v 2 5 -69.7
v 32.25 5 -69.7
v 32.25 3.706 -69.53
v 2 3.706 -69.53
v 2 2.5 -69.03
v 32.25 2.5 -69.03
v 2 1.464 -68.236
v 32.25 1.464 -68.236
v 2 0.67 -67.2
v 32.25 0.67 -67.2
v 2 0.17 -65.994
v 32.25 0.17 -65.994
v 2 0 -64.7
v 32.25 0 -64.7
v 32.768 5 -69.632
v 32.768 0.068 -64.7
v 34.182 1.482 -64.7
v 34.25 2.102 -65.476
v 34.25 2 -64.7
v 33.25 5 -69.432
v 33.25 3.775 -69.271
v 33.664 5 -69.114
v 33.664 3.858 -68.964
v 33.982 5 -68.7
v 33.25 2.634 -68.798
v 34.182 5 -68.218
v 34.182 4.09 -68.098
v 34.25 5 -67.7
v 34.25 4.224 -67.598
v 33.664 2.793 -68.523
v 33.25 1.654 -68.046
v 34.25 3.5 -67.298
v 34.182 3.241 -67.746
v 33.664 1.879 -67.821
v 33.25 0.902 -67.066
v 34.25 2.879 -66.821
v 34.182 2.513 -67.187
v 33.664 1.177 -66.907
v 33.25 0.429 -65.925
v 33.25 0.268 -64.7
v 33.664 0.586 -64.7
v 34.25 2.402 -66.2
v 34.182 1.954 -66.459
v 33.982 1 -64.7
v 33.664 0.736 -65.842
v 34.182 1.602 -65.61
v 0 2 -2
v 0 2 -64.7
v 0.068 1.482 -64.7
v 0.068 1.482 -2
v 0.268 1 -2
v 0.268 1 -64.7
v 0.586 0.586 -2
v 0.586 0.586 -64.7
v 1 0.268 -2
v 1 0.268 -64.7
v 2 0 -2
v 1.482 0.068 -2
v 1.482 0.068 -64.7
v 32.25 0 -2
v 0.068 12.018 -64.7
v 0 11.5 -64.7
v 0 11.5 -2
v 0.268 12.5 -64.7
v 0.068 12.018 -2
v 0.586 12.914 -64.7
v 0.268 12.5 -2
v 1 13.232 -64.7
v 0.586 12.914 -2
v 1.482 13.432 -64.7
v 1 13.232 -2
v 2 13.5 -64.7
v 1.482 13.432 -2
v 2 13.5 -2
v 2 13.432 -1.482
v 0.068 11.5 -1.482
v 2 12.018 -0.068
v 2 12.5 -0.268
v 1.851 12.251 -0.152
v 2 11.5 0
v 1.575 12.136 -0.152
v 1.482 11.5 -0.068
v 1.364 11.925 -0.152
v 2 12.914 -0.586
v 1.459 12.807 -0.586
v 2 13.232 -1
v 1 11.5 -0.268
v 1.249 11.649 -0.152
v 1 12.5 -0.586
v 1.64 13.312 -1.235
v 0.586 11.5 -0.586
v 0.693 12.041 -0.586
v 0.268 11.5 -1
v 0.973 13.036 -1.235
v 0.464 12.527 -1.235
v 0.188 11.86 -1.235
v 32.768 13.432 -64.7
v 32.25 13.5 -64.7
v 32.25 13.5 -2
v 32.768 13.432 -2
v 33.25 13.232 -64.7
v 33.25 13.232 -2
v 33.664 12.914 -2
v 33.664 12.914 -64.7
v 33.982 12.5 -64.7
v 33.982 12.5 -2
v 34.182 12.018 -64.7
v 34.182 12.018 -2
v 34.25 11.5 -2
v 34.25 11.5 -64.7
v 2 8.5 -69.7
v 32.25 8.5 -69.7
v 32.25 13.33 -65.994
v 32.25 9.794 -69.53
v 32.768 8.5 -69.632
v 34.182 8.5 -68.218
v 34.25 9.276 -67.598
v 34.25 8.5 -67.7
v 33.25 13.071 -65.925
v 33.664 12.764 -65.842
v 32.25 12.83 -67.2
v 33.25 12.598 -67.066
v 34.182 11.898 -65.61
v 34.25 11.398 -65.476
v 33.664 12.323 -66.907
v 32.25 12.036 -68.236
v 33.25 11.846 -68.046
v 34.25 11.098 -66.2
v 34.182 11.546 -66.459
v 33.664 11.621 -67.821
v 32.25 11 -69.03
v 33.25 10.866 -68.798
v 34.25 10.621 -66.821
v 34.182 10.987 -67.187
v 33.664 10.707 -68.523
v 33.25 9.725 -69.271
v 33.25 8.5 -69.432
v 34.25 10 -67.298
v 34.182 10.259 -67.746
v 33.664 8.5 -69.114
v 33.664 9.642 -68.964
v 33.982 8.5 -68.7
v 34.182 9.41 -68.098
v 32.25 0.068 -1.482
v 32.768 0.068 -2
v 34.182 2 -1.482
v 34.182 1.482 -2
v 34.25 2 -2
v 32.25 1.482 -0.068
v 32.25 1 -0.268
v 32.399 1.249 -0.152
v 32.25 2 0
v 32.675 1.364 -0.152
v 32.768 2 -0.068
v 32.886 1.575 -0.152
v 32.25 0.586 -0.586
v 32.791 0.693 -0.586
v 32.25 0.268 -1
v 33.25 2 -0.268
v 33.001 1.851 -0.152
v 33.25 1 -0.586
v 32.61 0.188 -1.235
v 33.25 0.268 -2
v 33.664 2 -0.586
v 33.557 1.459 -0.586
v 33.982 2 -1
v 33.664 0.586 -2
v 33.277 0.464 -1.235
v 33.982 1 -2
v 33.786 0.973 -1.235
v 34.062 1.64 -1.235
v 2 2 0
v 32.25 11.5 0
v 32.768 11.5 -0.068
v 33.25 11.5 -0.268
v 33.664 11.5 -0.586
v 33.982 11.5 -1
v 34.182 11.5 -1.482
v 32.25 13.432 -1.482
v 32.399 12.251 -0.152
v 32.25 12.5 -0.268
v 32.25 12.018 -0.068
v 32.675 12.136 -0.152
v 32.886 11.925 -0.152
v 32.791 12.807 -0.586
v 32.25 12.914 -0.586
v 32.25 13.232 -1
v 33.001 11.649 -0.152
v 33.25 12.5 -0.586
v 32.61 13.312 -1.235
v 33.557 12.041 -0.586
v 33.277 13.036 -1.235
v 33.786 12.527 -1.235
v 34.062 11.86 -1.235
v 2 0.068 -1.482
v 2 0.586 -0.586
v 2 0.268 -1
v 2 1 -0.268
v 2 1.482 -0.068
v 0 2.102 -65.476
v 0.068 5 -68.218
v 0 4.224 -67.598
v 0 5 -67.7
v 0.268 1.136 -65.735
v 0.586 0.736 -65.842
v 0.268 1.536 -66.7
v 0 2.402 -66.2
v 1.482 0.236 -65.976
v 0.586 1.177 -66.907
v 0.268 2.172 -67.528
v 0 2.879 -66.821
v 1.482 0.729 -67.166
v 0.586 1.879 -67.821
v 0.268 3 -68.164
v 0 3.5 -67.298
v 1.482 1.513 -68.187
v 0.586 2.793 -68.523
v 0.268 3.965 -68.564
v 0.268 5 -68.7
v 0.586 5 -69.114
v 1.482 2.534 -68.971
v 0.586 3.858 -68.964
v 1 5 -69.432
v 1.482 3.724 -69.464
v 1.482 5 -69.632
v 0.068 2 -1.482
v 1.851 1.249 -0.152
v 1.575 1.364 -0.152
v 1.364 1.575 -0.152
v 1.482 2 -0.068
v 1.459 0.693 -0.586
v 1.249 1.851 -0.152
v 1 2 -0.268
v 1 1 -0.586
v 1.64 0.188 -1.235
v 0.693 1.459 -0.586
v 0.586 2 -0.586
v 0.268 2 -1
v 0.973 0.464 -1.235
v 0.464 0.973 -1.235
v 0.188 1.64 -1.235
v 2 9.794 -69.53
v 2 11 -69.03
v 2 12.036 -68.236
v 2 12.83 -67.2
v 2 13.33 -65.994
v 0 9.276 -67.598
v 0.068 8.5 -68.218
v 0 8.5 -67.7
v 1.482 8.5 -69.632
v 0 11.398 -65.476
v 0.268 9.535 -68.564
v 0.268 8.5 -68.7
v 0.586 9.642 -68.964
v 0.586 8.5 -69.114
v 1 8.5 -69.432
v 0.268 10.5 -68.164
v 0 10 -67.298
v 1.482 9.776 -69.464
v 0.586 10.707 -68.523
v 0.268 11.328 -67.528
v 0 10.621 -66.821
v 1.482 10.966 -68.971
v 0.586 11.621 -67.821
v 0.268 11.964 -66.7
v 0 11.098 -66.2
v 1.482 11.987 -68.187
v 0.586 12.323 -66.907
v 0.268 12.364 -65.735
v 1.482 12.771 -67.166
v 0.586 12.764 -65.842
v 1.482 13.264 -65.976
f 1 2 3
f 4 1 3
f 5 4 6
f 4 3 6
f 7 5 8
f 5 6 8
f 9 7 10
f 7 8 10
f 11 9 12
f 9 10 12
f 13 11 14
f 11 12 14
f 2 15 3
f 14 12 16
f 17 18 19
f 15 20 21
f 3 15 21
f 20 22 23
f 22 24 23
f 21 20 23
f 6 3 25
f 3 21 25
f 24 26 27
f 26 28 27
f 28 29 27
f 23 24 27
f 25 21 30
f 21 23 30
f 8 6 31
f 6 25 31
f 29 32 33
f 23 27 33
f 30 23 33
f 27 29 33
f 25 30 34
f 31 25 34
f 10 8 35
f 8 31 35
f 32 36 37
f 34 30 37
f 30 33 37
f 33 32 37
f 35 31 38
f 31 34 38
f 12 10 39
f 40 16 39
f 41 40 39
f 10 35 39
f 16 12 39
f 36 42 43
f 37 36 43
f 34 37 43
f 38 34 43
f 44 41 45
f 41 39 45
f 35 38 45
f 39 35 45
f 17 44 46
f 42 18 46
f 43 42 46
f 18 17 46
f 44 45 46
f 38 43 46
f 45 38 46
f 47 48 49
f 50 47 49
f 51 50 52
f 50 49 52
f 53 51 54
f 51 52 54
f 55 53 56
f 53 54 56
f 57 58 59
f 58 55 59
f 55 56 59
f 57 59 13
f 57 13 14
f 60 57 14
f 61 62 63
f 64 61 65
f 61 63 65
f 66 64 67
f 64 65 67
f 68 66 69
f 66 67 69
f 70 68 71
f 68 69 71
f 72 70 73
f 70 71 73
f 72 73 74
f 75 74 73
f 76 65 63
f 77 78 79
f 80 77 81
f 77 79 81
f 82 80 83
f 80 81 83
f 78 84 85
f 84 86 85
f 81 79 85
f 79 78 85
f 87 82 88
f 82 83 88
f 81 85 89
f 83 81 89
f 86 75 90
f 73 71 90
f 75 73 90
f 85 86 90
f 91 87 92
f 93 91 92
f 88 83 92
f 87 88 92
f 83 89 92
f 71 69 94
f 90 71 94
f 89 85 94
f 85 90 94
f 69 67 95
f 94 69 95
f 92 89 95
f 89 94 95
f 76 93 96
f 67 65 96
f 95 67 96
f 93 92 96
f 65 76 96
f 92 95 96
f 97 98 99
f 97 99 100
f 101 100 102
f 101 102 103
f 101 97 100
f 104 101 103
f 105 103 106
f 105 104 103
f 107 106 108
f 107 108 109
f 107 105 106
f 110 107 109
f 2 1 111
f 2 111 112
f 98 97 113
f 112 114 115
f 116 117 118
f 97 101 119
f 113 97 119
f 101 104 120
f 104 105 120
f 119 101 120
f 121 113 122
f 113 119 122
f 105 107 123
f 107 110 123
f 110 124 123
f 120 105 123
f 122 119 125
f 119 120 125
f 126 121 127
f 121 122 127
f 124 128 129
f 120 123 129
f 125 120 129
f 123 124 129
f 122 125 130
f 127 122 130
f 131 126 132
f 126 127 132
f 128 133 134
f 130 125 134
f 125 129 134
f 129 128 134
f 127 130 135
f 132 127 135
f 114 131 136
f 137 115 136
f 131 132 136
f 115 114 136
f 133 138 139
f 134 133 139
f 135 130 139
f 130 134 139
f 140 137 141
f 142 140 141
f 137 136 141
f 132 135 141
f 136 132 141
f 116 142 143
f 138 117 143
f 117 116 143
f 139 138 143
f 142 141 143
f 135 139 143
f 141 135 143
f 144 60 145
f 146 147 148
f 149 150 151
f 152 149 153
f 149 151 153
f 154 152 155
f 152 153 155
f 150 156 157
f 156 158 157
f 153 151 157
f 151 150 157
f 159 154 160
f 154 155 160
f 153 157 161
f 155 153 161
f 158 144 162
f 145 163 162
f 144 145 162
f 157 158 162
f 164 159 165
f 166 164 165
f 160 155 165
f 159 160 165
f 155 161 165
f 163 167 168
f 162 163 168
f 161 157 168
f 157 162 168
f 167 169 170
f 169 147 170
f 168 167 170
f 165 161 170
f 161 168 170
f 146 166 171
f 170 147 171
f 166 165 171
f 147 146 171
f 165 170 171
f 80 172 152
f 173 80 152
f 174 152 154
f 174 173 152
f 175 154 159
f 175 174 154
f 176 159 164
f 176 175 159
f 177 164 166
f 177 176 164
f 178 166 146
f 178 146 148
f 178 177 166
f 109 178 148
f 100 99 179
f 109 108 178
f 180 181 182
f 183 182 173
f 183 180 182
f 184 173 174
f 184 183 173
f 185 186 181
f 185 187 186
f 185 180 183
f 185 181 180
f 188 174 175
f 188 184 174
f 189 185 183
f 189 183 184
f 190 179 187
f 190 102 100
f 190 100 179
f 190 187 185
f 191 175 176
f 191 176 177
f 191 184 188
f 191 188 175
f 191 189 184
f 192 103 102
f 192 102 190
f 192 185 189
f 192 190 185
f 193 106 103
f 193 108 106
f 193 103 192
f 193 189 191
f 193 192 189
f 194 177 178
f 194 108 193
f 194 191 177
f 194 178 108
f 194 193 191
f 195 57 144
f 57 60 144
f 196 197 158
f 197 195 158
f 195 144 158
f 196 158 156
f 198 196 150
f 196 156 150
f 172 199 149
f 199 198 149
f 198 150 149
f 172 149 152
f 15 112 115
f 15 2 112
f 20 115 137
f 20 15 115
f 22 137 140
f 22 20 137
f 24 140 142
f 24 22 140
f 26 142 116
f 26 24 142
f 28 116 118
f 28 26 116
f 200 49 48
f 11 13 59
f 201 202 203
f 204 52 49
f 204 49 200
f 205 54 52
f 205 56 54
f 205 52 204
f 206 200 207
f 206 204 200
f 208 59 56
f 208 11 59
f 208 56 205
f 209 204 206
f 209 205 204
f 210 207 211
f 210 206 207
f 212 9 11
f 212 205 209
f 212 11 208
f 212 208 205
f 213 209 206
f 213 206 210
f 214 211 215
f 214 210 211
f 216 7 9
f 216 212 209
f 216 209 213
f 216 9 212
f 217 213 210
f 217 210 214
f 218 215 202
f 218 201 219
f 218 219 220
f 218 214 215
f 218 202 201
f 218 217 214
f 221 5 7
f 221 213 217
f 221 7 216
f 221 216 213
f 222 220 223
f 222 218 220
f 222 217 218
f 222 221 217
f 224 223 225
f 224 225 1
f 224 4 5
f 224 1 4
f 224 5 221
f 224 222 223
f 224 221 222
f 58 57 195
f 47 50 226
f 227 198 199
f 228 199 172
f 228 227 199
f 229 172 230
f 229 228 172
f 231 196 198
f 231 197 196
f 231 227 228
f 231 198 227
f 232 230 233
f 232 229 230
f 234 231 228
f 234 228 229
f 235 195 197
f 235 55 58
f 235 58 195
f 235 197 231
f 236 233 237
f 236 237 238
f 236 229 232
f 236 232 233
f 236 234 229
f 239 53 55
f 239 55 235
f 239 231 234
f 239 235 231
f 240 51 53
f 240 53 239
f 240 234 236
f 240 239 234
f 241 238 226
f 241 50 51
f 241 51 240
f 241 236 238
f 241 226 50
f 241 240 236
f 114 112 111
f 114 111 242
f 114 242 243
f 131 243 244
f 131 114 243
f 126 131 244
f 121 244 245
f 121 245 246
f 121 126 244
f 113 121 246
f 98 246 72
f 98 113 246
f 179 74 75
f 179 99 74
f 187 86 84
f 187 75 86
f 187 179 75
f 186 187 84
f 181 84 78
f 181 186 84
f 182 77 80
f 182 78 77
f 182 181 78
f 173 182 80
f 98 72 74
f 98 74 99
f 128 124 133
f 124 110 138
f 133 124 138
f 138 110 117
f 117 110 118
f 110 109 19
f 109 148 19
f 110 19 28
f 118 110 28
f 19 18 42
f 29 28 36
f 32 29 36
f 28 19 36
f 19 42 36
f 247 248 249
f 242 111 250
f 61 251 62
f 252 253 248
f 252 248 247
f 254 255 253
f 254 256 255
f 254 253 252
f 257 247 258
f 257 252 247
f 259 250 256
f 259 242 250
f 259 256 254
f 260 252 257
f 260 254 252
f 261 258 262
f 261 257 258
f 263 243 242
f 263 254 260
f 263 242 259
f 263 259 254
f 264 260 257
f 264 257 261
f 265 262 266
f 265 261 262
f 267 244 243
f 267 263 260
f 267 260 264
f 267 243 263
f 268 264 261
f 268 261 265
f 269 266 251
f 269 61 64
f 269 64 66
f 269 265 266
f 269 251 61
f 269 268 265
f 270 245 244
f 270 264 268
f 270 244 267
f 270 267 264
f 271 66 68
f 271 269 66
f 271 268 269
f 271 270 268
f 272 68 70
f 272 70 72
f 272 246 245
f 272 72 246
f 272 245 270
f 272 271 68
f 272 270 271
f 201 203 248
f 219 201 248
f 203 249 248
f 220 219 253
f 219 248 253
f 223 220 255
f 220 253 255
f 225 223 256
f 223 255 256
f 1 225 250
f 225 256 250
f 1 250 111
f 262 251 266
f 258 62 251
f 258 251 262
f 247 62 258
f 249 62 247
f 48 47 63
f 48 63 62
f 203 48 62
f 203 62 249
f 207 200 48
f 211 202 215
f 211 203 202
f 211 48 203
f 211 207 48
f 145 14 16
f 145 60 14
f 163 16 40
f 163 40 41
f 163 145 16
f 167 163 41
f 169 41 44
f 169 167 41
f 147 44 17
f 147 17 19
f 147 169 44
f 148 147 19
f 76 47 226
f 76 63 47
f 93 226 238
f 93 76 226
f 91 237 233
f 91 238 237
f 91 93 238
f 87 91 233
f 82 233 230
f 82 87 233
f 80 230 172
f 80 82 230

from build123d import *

# Parameters (mm, degrees)
SKETCH1_W           = 34.25
SKETCH1_H           = 69.7
BOSS_EXTRUDE1_DEPTH = 13.5
FILLET1_R           = 5
FILLET2_R           = 2


with BuildPart() as part:
    # Sketch1 → Boss-Extrude1 (new body)
    with BuildSketch(Plane(origin=(0, 0, 0), x_dir=(1, 0, 0), z_dir=(0, 1, 0))):
        with Locations((17.125, 34.85)):
            Rectangle(SKETCH1_W, SKETCH1_H)
    extrude(amount=BOSS_EXTRUDE1_DEPTH)

    # Fillet1
    fillet1_edges = [part.edges().sort_by_distance(p)[0] for p in [
        (17.125, 13.5, -69.7),
        (17.125, 0, -69.7),
    ]]
    fillet(fillet1_edges, radius=FILLET1_R)

    # Fillet2
    fillet2_edges = [part.edges().sort_by_distance(p)[0] for p in [
        (34.25, 13.5, -32.35),
        (0, 6.75, -69.7),
        (34.25, 6.75, -69.7),
        (0, 0, -32.35),
        (0, 13.5, -32.35),
        (0, 12.035533906, -68.235533906),
        (0, 1.464466094, -68.235533906),
        (34.25, 12.035533906, -68.235533906),
        (34.25, 1.464466094, -68.235533906),
        (34.25, 0, -32.35),
        (17.125, 0, 0),
        (17.125, 13.5, 0),
        (34.25, 6.75, 0),
        (0, 6.75, 0),
    ]]
    fillet(fillet2_edges, radius=FILLET2_R)


solid = part.part
